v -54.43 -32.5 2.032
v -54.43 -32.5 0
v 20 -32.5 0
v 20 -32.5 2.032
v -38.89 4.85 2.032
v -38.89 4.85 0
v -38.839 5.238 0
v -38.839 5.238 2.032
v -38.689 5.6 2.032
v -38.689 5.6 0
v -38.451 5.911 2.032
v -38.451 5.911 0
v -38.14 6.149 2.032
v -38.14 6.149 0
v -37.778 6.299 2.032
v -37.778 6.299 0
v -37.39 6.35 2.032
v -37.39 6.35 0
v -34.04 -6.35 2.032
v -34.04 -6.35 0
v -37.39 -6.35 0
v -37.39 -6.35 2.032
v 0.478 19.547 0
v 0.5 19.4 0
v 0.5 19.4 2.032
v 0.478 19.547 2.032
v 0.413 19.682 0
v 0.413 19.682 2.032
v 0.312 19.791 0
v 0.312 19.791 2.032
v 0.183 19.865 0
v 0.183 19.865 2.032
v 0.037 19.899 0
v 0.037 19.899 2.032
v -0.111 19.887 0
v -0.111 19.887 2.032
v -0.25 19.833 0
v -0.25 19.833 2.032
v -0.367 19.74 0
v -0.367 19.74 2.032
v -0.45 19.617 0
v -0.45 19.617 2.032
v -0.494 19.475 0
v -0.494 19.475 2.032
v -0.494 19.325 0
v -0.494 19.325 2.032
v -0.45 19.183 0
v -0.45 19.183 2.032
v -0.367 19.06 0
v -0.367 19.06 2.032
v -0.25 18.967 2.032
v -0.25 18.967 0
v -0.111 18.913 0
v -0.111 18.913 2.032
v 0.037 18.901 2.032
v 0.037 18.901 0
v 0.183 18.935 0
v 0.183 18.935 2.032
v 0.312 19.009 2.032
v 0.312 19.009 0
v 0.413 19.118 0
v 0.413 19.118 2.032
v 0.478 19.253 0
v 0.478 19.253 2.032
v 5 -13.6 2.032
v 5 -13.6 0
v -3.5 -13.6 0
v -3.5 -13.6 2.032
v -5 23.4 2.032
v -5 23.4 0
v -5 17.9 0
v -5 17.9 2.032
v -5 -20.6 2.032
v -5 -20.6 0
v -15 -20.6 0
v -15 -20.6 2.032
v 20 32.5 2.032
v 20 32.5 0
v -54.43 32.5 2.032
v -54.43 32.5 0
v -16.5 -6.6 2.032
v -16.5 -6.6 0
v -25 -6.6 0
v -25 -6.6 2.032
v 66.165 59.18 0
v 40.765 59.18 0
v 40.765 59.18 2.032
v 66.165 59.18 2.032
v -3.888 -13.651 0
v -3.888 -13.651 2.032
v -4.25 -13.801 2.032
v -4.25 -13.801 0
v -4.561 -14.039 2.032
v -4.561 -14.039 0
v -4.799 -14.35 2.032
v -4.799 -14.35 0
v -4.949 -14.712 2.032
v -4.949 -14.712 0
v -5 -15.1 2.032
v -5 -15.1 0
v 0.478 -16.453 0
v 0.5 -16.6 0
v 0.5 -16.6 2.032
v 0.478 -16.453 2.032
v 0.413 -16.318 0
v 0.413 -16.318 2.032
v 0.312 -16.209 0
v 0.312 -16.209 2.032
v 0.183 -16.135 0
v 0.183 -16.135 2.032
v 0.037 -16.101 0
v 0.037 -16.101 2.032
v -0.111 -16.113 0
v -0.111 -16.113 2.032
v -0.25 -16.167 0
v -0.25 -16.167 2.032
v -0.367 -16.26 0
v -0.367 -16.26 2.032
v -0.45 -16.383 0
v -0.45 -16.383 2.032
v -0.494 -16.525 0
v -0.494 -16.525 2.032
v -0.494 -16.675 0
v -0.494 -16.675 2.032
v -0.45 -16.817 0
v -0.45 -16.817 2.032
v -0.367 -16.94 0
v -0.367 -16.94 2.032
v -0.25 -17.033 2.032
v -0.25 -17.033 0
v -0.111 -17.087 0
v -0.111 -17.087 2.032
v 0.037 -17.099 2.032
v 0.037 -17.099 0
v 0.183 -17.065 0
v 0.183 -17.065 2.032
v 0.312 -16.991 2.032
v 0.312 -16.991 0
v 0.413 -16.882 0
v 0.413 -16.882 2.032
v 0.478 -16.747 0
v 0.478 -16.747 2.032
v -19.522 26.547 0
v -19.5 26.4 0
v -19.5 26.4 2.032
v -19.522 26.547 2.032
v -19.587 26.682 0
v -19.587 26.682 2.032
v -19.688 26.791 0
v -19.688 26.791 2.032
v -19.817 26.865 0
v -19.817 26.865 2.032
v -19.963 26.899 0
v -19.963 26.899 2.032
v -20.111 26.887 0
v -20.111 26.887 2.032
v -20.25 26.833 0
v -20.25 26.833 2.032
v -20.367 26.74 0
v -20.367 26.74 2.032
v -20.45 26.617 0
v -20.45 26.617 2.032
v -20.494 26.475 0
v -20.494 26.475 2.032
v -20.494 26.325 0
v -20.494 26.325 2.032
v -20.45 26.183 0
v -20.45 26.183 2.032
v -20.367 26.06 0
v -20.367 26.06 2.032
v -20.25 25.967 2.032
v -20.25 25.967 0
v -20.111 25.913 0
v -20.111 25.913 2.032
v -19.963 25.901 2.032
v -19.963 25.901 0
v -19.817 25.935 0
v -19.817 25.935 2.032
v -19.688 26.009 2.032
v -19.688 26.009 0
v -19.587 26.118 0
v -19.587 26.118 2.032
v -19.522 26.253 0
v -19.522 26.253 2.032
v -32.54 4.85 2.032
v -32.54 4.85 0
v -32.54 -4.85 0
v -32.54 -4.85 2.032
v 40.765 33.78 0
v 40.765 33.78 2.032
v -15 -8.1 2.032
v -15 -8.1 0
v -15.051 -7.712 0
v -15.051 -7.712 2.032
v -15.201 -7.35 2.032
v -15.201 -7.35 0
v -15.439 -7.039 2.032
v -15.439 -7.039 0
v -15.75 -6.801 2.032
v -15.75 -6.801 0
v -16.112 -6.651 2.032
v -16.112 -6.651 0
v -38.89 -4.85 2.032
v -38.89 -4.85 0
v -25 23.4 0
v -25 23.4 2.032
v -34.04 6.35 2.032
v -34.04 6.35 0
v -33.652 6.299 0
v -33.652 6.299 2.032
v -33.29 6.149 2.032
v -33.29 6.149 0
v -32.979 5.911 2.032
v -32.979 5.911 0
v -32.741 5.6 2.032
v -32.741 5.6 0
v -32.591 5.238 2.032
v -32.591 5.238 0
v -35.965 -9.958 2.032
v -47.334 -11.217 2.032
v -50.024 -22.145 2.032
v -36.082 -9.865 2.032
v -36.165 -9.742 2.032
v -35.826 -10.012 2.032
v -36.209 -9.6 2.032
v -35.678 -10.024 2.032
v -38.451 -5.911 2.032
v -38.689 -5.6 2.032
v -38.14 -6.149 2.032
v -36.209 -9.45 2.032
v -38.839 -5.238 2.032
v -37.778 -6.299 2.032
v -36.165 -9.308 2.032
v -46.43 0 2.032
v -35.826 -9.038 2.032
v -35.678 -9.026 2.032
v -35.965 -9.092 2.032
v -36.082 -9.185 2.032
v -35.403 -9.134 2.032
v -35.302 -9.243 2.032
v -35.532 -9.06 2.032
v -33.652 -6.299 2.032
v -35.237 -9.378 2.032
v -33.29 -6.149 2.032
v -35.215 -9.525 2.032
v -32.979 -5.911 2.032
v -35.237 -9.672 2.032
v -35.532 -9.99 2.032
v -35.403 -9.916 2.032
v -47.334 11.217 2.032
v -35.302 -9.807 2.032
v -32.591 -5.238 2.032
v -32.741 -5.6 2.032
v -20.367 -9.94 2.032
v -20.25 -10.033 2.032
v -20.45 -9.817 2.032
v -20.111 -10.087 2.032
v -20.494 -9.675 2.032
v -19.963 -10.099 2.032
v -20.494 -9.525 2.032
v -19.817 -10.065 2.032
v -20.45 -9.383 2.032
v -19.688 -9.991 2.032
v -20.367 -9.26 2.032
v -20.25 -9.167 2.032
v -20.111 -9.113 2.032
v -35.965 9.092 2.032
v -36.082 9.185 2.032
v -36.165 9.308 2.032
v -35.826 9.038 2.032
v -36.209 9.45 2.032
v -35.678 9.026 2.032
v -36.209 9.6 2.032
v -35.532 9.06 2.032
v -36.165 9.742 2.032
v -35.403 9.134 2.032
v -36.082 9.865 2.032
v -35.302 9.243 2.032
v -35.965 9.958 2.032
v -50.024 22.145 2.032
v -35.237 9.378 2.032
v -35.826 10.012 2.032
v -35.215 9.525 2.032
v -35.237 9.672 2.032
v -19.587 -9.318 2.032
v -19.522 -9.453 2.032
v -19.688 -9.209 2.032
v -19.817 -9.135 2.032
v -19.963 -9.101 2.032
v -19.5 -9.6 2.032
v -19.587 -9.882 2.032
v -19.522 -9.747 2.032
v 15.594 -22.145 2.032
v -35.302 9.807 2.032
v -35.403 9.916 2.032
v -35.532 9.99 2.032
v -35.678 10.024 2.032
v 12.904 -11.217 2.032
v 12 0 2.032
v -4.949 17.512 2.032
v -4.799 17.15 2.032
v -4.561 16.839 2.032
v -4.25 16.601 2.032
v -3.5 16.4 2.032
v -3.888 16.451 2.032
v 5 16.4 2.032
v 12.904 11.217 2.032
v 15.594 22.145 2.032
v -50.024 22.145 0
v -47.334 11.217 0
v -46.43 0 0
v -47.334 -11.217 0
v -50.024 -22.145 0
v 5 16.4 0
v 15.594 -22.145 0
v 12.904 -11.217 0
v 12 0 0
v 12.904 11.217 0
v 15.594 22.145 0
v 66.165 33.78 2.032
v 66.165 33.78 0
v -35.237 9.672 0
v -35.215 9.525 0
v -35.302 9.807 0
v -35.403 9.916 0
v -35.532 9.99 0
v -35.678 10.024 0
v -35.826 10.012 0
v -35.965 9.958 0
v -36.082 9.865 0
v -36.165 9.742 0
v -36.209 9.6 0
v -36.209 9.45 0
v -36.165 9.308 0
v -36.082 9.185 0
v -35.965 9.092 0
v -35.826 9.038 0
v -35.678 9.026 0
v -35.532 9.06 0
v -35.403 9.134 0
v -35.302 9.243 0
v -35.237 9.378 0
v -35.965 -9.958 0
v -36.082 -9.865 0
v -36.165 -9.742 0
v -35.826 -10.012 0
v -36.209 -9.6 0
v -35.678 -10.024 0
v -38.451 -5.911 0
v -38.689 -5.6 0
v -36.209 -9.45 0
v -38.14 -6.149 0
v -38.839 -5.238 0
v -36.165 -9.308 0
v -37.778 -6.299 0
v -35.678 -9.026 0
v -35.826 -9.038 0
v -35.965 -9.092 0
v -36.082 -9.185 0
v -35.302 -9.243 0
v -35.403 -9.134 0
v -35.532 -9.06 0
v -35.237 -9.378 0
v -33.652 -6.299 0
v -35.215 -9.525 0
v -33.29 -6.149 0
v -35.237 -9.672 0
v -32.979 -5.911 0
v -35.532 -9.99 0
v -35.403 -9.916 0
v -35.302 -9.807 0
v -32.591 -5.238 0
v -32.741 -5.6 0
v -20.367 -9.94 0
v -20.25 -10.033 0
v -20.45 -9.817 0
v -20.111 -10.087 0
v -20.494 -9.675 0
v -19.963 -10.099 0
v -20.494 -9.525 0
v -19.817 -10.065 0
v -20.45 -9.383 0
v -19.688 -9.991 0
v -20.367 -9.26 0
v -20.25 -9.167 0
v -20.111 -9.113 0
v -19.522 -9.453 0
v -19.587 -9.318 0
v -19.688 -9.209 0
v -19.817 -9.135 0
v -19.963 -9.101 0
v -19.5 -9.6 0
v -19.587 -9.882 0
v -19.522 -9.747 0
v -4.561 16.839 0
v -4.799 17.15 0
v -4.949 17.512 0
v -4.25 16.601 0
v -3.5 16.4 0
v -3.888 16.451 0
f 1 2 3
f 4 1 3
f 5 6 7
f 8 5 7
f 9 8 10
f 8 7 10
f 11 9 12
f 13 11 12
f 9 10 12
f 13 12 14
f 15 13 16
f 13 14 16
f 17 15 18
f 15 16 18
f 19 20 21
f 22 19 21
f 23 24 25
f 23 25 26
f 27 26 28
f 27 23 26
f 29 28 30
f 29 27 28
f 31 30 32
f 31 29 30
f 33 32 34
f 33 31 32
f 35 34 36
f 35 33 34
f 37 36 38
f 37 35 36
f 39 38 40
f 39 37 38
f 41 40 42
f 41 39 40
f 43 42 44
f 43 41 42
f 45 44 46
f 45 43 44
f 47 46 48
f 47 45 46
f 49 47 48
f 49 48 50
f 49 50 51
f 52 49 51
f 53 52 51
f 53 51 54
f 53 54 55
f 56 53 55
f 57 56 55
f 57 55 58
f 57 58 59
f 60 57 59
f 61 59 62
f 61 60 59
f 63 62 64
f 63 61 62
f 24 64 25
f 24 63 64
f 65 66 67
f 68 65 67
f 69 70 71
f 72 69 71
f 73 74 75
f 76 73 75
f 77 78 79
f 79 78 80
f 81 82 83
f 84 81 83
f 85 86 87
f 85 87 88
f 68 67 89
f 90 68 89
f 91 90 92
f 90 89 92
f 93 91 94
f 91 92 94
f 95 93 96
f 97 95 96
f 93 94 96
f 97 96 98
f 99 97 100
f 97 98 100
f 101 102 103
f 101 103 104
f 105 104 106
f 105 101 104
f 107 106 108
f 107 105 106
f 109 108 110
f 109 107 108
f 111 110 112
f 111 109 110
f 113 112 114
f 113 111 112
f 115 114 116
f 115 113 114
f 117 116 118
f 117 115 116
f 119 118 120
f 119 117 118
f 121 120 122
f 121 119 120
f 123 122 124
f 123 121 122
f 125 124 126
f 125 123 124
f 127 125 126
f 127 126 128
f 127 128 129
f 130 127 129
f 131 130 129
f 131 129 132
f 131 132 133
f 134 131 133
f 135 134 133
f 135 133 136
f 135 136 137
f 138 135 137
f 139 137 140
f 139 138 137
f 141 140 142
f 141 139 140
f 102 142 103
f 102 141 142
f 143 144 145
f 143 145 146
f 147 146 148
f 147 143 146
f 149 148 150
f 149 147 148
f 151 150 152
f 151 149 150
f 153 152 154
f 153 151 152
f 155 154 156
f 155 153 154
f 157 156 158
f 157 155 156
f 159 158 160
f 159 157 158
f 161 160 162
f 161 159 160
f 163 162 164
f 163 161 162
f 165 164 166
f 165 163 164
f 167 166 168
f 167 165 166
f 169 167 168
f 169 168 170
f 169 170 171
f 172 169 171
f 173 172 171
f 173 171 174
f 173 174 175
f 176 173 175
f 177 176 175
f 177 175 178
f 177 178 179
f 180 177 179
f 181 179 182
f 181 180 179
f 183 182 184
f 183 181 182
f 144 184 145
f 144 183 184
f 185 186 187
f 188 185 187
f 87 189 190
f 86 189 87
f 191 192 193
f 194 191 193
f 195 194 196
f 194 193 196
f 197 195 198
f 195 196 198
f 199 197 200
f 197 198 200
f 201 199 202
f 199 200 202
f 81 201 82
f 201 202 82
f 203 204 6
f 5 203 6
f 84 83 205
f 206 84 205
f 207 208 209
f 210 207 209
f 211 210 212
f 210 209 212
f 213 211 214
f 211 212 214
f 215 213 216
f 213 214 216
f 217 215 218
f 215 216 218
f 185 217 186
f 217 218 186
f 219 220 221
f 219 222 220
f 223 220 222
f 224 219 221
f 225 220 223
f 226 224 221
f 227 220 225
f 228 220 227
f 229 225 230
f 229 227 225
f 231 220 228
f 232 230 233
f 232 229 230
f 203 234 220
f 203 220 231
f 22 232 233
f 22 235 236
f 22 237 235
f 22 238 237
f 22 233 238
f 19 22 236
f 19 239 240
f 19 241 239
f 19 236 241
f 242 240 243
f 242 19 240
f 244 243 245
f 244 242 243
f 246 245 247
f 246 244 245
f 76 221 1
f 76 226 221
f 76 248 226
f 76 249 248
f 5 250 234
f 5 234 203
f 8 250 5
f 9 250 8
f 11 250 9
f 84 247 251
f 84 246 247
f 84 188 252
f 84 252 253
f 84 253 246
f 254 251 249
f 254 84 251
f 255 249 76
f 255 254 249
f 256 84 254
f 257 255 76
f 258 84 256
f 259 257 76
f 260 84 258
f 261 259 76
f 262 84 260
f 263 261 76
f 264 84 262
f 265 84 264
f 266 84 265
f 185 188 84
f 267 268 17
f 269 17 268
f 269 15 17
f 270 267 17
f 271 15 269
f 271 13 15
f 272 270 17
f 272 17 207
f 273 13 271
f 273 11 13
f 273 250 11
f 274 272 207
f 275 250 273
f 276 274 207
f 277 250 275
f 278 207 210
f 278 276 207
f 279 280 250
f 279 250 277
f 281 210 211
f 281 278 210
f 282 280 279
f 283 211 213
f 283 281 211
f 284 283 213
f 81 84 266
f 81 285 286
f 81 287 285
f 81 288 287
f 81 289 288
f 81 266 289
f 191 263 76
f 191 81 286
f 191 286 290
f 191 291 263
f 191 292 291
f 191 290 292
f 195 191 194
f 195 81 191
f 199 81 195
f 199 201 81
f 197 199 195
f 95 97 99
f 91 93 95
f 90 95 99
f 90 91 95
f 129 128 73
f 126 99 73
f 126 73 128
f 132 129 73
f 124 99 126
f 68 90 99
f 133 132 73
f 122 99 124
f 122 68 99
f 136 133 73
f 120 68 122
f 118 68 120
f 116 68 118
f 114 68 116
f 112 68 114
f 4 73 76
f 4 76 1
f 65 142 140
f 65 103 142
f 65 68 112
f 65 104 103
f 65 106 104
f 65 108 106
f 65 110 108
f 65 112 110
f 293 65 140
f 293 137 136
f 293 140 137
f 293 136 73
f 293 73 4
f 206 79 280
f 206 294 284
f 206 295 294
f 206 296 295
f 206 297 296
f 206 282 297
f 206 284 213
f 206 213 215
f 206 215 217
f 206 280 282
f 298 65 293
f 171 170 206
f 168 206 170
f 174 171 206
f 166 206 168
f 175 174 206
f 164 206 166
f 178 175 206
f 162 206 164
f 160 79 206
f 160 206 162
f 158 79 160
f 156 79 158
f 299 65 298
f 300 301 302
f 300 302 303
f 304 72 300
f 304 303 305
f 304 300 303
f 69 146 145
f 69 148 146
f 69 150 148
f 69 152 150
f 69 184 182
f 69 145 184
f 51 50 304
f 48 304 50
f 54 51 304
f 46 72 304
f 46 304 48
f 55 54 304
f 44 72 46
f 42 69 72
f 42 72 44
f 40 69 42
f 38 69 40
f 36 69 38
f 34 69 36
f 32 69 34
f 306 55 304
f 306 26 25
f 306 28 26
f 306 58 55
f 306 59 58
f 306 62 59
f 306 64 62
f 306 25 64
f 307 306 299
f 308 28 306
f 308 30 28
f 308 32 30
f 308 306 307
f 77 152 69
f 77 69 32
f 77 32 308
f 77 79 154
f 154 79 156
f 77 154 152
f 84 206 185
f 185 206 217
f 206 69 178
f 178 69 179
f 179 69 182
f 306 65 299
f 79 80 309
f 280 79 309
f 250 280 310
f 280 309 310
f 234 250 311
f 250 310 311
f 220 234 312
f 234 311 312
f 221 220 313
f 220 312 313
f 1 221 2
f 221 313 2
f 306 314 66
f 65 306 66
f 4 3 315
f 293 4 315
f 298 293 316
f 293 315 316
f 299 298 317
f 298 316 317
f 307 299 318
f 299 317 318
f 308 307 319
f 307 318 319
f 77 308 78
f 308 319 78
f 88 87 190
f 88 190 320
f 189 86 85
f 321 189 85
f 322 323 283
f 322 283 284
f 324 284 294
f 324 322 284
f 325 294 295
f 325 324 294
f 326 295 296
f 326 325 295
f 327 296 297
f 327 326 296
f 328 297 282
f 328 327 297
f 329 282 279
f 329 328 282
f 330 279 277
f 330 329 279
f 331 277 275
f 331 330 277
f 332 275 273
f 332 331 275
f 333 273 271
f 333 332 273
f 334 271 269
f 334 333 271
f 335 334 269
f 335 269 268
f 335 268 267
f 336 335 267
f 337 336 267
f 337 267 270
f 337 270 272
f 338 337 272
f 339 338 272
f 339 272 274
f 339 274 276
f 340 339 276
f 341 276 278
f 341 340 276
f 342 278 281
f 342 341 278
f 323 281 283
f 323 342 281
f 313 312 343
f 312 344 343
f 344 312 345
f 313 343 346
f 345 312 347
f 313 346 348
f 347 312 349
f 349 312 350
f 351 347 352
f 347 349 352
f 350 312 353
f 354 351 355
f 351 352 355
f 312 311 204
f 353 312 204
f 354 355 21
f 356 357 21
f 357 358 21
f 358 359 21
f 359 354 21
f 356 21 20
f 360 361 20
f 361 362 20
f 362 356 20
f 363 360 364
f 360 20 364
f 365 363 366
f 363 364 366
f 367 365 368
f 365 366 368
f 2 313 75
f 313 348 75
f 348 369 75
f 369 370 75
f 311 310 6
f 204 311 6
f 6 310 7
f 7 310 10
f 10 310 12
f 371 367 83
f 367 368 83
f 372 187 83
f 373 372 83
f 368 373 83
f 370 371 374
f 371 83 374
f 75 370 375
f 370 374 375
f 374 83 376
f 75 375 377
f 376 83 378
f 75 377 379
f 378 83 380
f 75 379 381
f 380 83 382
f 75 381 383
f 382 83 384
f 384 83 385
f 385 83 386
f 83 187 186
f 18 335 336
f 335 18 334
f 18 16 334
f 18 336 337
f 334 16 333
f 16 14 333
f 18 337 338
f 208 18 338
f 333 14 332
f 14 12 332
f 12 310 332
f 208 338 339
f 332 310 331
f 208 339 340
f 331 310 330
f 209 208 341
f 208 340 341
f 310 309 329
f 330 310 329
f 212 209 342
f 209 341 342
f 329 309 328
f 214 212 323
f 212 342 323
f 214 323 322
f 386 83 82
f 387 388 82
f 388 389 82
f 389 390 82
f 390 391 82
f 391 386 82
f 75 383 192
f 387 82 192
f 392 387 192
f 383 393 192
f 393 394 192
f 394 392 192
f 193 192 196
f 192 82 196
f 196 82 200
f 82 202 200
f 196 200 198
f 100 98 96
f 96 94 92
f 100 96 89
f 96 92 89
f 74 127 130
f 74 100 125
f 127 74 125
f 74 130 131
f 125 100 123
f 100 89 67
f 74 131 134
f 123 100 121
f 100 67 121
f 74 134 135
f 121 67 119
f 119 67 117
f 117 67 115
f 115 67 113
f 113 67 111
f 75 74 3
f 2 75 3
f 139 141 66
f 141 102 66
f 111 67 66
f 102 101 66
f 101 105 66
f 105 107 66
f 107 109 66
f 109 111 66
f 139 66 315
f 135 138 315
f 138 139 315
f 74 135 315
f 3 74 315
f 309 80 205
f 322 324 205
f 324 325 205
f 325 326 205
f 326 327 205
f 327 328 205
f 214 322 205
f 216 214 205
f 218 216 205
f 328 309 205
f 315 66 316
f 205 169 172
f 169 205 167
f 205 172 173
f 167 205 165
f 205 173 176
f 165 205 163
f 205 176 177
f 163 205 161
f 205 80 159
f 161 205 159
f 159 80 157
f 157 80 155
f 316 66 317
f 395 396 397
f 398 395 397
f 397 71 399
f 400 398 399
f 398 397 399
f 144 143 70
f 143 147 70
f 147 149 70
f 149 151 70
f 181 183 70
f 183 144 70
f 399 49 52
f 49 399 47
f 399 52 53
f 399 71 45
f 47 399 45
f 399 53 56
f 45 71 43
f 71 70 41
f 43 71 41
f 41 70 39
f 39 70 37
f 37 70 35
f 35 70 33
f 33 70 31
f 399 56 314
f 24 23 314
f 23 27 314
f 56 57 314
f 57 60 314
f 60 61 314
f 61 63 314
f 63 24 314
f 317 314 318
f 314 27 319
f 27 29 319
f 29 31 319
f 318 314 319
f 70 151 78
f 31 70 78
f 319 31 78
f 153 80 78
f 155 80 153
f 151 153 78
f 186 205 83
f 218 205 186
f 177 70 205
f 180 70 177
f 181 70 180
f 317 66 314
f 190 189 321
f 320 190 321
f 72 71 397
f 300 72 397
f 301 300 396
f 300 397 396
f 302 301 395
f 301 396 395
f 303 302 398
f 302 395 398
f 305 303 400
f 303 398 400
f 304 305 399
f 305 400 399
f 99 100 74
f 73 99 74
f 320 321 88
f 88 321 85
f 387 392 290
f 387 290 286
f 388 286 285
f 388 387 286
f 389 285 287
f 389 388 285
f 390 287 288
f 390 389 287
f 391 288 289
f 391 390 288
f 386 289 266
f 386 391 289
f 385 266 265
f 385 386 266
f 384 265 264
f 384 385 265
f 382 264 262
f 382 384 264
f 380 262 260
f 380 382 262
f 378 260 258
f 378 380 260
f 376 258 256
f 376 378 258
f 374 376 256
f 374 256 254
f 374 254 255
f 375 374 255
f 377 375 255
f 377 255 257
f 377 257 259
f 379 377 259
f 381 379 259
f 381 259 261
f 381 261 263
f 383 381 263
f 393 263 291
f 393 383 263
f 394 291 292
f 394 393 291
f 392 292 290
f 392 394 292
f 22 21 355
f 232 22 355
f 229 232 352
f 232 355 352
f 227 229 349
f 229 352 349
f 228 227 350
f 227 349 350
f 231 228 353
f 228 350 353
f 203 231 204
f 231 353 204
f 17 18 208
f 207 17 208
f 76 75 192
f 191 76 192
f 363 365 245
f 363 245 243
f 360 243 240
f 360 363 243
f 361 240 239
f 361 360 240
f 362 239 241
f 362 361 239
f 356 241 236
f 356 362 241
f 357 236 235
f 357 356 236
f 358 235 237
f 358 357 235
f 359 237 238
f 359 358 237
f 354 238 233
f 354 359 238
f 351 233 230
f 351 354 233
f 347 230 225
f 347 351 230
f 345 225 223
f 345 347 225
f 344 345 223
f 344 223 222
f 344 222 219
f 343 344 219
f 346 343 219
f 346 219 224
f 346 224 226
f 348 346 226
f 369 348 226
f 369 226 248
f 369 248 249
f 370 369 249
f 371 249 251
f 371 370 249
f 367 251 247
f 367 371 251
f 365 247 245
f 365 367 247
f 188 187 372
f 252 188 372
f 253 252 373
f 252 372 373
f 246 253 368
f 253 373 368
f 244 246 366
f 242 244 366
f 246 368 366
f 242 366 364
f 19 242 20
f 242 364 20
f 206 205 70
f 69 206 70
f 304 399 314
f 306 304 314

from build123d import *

# Parameters (mm, degrees)
F0_R     = 0.5
F1_DEPTH = 2.032
F0_W     = 25.4
F0_H     = 25.4


# Not quite as in the source:
# - ends of sketch curves that miss each other by under 0.0002 mm in the source are joined


with BuildPart() as f1:
    # F0 (on Top) → F1 (new body)
    with BuildSketch(Plane.XY):
        with BuildLine():
            ThreePointArc((-54.43, 32.4999997839), (-46.43, -2.161e-07), (-54.43, -32.5000002161))
            Line((-54.43, -32.5000002161), (20, -32.5000002161))
            ThreePointArc((20, -32.5000002161), (12, -2.161e-07), (20, 32.4999997839))
            Line((20, 32.4999997839), (-54.43, 32.4999997839))
        make_face()
        with Locations((-20, -9.6000002161)):
            Circle(F0_R, mode=Mode.SUBTRACT)
        with Locations((0, -16.6)):
            Circle(F0_R, mode=Mode.SUBTRACT)
        with Locations((-35.715, -9.525)):
            Circle(F0_R, mode=Mode.SUBTRACT)
        with BuildLine():
            Line((-32.54, 4.8499995679), (-32.54, -4.85))
            ThreePointArc((-32.54, -4.85), (-32.9793398282, -5.9106601718), (-34.04, -6.35))
            Line((-34.04, -6.35), (-37.39, -6.35))
            ThreePointArc((-37.39, -6.35), (-38.4506601718, -5.9106606039), (-38.89, -4.8500004321))
            Line((-38.89, -4.8500004321), (-38.89, 4.85))
            ThreePointArc((-38.89, 4.85), (-38.4506601718, 5.9106601718), (-37.39, 6.35))
            Line((-37.39, 6.35), (-34.04, 6.35))
            ThreePointArc((-34.04, 6.35), (-32.9793398282, 5.9106597396), (-32.54, 4.8499995679))
        make_face(mode=Mode.SUBTRACT)
        with Locations((-35.715, 9.5249997839)):
            Circle(F0_R, mode=Mode.SUBTRACT)
        with BuildLine():
            Line((-5, -20.6000001803), (-15, -20.6000001803))
            Line((-15, -20.6000001803), (-15, -8.1000002161))
            ThreePointArc((-15, -8.1000002161), (-15.4393398282, -7.0393400443), (-16.5, -6.6000002161))
            Line((-16.5, -6.6000002161), (-25, -6.6000002161))
            Line((-25, -6.6000002161), (-25, 23.3999996036))
            Line((-25, 23.3999996036), (-5, 23.3999996036))
            Line((-5, 23.3999996036), (-5, 17.9))
            ThreePointArc((-5, 17.9), (-4.5606601718, 16.8393398282), (-3.5, 16.4))
            Line((-3.5, 16.4), (5, 16.4))
            Line((5, 16.4), (5, -13.5999998197))
            Line((5, -13.5999998197), (-3.5, -13.6))
            ThreePointArc((-3.5, -13.6), (-4.5606601718, -14.0393398282), (-5, -15.1))
            Line((-5, -15.1), (-5, -20.6000001803))
        make_face(mode=Mode.SUBTRACT)
        with Locations((0, 19.4)):
            Circle(F0_R, mode=Mode.SUBTRACT)
        with Locations((-20, 26.3999997839)):
            Circle(F0_R, mode=Mode.SUBTRACT)
    extrude(amount=F1_DEPTH)


with BuildPart() as f1b:
    # F0 (on Top) → F1, piece 2 (new body)
    with BuildSketch(Plane.XY):
        with Locations((53.4646574736, 46.4799787521)):
            Rectangle(F0_W, F0_H)
    extrude(amount=F1_DEPTH)


solid = Compound([f1.part, f1b.part])
